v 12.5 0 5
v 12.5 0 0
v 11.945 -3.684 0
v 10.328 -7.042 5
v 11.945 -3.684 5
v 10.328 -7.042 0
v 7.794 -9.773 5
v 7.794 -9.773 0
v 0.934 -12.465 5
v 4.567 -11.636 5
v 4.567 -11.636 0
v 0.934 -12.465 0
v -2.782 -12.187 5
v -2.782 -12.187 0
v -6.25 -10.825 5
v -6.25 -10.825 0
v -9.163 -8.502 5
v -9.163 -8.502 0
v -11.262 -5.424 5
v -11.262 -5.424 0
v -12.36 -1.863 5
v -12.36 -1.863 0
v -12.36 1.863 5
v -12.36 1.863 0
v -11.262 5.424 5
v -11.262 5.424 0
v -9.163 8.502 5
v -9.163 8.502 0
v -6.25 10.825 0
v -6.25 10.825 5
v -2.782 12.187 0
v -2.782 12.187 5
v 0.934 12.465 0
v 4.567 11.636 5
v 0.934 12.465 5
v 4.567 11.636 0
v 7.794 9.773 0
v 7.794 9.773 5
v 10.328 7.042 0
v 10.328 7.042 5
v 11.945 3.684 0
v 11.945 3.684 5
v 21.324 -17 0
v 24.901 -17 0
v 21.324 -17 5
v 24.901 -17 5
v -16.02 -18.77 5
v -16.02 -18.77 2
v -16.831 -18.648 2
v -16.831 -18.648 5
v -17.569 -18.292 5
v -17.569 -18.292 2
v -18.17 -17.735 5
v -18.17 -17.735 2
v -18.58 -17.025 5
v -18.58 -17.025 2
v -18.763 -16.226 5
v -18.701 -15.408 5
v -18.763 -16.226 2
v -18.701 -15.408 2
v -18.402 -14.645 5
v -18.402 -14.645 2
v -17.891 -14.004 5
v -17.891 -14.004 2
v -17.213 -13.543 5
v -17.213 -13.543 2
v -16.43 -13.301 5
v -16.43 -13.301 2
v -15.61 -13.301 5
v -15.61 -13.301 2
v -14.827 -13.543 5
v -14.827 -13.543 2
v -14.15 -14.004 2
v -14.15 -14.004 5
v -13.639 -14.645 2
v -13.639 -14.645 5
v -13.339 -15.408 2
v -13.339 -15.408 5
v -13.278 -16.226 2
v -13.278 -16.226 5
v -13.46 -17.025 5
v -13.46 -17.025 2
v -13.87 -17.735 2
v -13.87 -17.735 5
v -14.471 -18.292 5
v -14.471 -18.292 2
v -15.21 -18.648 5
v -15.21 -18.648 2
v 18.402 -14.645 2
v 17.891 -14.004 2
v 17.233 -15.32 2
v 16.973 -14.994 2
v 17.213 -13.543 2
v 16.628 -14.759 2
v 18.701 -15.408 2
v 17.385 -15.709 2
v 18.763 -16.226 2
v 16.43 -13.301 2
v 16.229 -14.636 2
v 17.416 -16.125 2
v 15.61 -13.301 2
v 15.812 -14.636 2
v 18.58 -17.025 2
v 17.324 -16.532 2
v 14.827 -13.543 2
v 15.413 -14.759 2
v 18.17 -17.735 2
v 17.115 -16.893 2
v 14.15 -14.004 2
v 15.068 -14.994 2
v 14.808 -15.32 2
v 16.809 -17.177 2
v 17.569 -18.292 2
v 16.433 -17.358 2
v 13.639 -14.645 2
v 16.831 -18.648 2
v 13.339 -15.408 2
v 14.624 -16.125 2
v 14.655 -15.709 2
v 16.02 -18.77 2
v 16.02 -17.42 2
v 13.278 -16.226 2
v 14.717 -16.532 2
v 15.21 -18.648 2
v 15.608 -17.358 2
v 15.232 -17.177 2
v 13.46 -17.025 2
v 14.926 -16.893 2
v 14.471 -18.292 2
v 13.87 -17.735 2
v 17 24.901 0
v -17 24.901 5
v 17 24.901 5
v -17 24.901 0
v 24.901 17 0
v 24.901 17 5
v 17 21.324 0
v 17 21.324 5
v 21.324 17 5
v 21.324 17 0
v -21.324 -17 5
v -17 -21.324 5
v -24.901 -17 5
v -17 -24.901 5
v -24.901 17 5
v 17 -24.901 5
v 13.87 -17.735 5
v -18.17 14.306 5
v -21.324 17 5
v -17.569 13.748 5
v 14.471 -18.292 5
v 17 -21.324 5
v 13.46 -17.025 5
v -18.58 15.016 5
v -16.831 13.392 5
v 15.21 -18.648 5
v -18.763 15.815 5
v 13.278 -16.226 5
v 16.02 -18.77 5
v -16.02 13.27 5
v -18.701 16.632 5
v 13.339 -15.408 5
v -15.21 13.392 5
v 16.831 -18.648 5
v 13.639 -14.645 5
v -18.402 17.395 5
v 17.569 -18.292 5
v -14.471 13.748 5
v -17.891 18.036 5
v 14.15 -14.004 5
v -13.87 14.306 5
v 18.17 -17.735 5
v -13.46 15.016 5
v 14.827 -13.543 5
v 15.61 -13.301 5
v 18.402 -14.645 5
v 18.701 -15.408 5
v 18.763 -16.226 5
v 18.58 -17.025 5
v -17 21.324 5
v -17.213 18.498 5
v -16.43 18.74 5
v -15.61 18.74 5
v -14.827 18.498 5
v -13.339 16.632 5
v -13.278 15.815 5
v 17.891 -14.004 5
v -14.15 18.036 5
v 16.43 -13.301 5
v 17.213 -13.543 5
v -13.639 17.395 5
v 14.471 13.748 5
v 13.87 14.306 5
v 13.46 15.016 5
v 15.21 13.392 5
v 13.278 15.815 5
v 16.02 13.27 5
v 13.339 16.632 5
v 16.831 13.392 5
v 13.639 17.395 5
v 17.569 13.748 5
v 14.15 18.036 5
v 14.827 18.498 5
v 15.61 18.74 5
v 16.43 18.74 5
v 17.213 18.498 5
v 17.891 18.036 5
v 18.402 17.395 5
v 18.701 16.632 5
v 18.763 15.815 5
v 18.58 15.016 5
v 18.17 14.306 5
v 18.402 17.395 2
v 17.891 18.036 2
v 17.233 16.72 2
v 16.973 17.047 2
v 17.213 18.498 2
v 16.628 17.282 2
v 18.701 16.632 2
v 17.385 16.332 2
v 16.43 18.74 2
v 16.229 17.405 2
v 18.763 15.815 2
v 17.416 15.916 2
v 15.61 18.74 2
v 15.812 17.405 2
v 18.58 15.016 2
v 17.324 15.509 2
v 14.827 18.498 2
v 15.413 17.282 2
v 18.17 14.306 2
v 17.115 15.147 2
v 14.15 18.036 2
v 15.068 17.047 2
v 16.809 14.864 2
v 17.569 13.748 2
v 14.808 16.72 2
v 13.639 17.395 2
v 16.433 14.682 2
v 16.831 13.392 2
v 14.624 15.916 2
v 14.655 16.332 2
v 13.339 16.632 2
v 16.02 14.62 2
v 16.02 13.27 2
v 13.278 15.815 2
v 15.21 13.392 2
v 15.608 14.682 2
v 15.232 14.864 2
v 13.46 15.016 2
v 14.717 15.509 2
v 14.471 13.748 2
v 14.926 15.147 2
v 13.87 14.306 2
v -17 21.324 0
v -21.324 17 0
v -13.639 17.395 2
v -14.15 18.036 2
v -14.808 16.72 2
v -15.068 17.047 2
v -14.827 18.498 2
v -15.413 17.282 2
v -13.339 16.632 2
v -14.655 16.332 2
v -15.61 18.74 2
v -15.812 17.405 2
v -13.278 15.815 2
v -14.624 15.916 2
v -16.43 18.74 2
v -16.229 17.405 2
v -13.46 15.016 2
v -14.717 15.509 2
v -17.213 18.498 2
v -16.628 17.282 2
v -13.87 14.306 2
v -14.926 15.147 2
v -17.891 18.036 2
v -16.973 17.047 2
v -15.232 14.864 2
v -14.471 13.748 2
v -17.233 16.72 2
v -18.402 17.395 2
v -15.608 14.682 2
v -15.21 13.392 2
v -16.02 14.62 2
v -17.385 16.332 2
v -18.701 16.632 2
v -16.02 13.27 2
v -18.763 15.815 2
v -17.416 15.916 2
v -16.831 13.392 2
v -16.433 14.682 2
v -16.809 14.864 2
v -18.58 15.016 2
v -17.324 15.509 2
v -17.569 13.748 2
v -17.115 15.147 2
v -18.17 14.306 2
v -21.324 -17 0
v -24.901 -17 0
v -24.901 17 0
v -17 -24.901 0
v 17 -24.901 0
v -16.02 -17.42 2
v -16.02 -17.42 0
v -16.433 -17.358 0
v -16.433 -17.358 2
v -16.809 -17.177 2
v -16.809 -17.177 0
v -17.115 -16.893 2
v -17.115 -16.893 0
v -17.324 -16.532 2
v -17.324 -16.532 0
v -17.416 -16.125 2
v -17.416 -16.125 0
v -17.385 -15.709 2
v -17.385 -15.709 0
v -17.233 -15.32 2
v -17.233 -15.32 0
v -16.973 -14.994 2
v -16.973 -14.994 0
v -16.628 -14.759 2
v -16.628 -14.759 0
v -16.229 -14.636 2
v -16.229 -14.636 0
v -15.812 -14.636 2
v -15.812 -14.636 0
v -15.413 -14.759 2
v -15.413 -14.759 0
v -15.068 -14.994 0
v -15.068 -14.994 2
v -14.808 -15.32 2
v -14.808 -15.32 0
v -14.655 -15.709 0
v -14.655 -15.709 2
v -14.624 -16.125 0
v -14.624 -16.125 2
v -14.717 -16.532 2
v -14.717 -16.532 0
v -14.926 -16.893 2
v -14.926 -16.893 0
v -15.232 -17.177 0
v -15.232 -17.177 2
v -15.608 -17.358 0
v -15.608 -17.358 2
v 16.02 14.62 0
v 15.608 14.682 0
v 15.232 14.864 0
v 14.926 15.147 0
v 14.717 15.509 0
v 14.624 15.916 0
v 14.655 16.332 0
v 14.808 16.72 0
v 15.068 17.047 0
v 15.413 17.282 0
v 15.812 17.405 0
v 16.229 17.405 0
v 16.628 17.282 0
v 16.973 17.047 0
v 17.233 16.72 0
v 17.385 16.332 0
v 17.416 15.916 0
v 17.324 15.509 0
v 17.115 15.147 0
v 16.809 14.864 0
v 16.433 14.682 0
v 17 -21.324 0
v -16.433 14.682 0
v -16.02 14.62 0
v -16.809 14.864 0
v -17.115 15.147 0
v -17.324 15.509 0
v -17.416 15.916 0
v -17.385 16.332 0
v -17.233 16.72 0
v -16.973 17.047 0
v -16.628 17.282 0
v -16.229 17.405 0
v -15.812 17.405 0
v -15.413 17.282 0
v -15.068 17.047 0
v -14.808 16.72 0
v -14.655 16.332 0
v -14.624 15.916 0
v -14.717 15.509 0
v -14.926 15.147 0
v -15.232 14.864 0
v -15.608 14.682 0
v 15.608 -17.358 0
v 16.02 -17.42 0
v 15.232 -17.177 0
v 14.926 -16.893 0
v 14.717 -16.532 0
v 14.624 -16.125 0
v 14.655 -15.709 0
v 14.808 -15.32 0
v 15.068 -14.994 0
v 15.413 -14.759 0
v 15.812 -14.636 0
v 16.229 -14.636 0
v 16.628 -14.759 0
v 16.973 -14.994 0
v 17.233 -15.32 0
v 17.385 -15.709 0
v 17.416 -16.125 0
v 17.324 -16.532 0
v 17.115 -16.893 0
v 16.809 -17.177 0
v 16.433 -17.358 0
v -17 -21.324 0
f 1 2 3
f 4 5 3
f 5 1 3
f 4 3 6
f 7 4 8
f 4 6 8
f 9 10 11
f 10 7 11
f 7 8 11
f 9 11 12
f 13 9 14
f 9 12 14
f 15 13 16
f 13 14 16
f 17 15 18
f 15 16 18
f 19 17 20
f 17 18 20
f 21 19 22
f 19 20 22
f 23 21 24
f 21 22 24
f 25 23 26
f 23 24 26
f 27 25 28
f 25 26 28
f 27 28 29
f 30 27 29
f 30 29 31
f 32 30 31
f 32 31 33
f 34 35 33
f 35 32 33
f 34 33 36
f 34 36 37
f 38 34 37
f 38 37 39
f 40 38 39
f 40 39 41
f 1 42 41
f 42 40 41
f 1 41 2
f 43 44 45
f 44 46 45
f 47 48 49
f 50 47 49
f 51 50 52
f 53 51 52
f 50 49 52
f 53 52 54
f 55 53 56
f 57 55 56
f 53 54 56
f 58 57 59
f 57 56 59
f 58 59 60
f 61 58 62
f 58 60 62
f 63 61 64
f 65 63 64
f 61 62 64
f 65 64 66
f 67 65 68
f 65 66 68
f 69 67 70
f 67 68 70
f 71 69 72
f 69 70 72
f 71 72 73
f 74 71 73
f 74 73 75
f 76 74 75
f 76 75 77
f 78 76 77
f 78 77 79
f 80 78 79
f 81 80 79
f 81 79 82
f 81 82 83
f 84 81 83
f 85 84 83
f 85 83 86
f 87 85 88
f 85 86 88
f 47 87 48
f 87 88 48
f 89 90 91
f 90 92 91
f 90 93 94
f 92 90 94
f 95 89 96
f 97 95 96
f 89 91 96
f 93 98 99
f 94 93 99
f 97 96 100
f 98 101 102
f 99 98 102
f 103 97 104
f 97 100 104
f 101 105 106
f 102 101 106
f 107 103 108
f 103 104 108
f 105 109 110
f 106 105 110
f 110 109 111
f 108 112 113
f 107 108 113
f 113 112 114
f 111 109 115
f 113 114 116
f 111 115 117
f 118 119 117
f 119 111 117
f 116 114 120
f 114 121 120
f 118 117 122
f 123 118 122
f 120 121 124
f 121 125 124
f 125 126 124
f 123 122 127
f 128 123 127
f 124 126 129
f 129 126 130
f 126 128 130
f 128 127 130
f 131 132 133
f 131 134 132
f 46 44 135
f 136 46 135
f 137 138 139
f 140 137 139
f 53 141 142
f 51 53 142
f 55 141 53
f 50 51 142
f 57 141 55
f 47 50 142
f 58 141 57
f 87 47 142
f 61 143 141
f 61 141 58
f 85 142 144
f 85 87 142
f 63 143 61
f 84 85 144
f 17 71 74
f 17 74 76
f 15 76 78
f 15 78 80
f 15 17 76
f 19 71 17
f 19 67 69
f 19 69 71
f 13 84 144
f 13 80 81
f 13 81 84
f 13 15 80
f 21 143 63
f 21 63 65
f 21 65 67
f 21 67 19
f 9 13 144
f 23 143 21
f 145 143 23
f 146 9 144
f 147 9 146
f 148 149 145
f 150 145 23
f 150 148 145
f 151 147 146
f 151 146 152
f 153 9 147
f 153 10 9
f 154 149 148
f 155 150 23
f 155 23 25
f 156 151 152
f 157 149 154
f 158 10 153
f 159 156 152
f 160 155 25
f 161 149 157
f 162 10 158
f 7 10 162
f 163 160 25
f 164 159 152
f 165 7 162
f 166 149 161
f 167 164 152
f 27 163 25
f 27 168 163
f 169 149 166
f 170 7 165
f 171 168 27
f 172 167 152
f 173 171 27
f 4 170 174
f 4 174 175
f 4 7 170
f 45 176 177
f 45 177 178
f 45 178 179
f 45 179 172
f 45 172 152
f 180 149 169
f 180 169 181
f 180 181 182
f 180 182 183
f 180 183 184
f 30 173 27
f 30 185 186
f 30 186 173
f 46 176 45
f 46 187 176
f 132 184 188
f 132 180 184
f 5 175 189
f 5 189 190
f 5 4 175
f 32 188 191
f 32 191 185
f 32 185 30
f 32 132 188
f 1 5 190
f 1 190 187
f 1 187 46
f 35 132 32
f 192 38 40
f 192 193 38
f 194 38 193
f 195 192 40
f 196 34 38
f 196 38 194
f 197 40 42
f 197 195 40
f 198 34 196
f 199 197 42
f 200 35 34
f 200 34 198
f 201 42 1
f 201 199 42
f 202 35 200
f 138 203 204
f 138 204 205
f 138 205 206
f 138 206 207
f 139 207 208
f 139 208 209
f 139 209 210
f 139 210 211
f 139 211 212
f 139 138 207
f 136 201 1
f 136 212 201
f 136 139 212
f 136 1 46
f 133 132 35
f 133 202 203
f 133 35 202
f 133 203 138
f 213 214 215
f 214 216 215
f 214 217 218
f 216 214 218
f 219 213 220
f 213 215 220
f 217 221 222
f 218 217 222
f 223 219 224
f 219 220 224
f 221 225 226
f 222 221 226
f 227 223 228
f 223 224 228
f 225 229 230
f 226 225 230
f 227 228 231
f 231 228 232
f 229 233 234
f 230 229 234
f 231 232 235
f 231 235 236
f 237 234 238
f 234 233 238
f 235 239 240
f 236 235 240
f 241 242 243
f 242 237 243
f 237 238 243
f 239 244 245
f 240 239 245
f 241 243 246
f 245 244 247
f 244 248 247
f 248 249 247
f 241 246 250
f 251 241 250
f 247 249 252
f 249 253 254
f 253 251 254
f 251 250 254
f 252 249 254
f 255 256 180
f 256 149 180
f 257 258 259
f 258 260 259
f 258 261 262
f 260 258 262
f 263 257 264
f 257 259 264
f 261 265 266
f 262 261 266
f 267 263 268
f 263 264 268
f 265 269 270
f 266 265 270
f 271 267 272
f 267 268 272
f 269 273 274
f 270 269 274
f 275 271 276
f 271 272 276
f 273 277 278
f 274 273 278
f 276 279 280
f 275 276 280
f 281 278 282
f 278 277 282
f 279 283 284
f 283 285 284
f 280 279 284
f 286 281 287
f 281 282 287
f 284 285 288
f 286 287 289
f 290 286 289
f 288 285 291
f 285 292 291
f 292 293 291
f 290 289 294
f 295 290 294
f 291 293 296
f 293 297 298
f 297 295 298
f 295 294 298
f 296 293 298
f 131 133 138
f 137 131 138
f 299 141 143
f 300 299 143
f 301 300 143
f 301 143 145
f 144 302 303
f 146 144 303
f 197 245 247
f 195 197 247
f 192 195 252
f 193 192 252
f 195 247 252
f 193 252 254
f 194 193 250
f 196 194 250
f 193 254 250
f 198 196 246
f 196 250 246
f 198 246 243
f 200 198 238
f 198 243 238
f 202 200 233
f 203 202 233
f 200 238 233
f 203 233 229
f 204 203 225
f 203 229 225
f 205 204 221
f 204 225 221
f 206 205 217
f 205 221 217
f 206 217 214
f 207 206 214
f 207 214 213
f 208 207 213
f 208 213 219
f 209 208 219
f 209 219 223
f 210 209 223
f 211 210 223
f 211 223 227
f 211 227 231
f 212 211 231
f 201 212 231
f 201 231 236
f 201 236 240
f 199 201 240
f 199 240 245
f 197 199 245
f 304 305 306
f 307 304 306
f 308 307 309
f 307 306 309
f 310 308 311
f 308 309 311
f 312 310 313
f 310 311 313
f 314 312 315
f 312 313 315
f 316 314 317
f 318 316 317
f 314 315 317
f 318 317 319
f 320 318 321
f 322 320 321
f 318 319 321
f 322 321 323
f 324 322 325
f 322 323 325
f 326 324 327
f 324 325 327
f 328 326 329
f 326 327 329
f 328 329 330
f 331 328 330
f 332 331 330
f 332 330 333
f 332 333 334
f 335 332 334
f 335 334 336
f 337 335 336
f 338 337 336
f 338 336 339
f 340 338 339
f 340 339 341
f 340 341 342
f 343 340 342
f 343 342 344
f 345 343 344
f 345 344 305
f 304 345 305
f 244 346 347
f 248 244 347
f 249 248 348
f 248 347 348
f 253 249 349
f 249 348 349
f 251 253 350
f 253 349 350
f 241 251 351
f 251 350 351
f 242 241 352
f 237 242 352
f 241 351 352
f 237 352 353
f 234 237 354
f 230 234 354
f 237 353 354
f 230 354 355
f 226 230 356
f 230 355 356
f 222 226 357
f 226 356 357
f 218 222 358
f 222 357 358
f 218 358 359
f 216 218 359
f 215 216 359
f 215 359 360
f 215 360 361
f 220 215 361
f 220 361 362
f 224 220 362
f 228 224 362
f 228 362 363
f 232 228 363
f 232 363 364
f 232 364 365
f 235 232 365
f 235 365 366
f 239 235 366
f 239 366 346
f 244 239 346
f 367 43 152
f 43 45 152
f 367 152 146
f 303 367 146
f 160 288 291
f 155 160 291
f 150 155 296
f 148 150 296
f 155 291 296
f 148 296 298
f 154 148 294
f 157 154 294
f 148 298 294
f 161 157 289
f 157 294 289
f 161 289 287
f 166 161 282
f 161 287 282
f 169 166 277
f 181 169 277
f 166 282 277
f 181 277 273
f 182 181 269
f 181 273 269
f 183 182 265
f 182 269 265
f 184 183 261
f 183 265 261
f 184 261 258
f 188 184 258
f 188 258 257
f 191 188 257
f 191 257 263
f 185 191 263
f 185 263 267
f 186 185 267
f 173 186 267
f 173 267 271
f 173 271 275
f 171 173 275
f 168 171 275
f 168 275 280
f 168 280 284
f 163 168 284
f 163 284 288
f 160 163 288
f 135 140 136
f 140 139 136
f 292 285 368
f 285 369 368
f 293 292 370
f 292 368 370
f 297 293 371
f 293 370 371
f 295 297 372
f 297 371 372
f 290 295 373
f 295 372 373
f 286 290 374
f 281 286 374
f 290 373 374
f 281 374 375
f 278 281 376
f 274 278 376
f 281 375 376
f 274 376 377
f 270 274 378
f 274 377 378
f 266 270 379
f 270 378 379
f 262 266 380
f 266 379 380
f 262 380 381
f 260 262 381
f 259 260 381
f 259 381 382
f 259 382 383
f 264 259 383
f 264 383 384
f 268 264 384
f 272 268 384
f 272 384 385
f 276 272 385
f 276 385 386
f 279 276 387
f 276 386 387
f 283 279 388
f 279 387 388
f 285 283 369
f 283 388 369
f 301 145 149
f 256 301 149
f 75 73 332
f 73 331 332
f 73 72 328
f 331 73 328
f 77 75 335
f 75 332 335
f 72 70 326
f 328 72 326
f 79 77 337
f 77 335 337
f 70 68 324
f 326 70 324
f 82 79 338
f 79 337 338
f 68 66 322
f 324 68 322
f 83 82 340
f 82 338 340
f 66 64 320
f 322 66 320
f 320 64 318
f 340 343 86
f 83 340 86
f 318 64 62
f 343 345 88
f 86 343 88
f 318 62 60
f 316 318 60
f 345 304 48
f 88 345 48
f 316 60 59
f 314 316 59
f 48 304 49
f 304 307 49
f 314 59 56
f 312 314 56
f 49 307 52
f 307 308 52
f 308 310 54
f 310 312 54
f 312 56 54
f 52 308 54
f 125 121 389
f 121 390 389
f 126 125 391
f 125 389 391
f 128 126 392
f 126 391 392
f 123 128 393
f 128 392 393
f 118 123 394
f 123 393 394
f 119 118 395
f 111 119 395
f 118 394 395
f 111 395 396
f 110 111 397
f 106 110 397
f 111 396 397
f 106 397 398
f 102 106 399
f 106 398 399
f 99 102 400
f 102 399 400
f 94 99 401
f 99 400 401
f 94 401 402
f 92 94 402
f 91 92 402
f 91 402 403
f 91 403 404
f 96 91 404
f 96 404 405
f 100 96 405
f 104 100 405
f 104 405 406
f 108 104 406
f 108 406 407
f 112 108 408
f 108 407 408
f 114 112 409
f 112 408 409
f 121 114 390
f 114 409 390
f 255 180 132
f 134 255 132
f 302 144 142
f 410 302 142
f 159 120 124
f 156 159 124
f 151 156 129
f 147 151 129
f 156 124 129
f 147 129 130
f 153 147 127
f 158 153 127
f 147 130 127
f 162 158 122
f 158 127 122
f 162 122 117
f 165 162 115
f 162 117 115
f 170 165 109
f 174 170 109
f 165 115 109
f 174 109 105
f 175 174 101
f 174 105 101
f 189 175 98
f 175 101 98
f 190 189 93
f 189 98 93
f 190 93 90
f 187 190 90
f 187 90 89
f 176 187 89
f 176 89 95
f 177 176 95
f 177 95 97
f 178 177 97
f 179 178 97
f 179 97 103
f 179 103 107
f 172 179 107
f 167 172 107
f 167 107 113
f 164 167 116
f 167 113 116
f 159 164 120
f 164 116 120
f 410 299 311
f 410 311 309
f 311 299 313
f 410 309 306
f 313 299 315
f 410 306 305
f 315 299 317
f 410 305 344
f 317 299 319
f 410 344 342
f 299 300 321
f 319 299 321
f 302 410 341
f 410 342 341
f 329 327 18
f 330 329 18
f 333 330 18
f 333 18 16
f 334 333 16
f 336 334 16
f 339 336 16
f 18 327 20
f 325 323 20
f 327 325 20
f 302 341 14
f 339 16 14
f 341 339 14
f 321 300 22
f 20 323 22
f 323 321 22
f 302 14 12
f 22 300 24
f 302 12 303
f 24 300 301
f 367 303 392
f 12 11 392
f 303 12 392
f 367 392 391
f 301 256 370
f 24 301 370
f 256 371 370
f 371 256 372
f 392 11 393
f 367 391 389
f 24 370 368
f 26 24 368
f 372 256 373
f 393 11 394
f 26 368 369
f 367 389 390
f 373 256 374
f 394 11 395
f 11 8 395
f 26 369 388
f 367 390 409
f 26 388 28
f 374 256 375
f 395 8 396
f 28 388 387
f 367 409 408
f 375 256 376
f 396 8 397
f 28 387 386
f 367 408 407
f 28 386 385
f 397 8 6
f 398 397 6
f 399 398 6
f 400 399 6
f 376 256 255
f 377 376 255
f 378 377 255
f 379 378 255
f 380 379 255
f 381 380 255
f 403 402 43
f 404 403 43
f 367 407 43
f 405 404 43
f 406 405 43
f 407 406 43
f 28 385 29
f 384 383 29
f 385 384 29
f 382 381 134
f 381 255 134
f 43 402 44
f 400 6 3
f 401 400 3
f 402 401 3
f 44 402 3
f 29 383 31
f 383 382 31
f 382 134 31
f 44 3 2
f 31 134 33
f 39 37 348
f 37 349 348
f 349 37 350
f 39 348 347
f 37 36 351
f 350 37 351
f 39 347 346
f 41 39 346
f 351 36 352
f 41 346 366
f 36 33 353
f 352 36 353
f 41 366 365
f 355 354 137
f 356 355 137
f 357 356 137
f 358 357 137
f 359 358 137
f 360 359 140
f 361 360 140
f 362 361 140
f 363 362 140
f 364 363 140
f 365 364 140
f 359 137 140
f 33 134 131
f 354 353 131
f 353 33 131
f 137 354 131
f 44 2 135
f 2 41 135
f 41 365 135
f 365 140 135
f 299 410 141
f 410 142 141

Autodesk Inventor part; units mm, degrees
ref_plane "YZ Plane" through (0, 0, 0) normal (1, 0, 0) x (0, 1, 0)
ref_plane "XZ Plane" through (0, 0, 0) normal (0, 1, 0) x (-1, 0, 0)
ref_plane "XY Plane" through (0, 0, 0) normal (0, 0, 1) x (1, 0, 0)
sketch "Sketch1" plane through (0, 0, 0) normal (0, 0, 1) x (1, 0, 0)
  line L0 (-39.3843, 0) -> (62.0012, 0) construction
  line L1 (0, -36.6008) -> (0, 45.3001) construction
  line L2 (0, 0) -> (33.6, 33.6) construction
  line L3 (0, 0) -> (47.5176, 0) construction
  line L4 (0, 24.9006) -> (16.8, 24.9006)
  line L5 (16.8, 24.9006) -> (16.8, 21.2406)
  line L6 (16.8, 21.2406) -> (19.0203, 19.0203)
  line L7 (24.9006, 0) -> (24.9006, 16.8)
  line L8 (24.9006, 16.8) -> (21.2406, 16.8)
  line L9 (21.2406, 16.8) -> (19.0203, 19.0203)
  line L10 (0, 24.9006) -> (-16.8, 24.9006)
  line L11 (-16.8, 24.9006) -> (-16.8, 21.2406)
  line L12 (-16.8, 21.2406) -> (-19.0203, 19.0203)
  line L13 (-24.9006, 0) -> (-24.9006, 16.8)
  line L14 (-24.9006, 16.8) -> (-21.2406, 16.8)
  line L15 (-21.2406, 16.8) -> (-19.0203, 19.0203)
  line L16 (0, -24.9006) -> (16.8, -24.9006)
  line L17 (16.8, -24.9006) -> (16.8, -21.2406)
  line L18 (16.8, -21.2406) -> (19.0203, -19.0203)
  line L19 (24.9006, 0) -> (24.9006, -16.8)
  line L20 (24.9006, -16.8) -> (21.2406, -16.8)
  line L21 (21.2406, -16.8) -> (19.0203, -19.0203)
  line L22 (0, -24.9006) -> (-16.8, -24.9006)
  line L23 (-16.8, -24.9006) -> (-16.8, -21.2406)
  line L24 (-16.8, -21.2406) -> (-19.0203, -19.0203)
  line L25 (-24.9006, 0) -> (-24.9006, -16.8)
  line L26 (-24.9006, -16.8) -> (-21.2406, -16.8)
  line L27 (-21.2406, -16.8) -> (-19.0203, -19.0203)
  circle A0 centre (0, 0) radius 12.5
  dimension "d0" = 45
  dimension "d1" = 16.8
  dimension "d2" = 3.66
  dimension "d3" = 3.14
  dimension "d4" = 25
extrude "Extrusion1" add sketch "Sketch1" along normal blind 5
sketch "Sketch2" plane through (0, 0, 5) normal (0, 0, 1) x (1, 0, 0)
  circle A0 centre (0, 0) radius 12.5 construction
  line L0 (16.8, 24.9006) -> (-16.8, 24.9006) construction
  line L1 (-16.8, 24.9006) -> (-16.8, 21.2406) construction
  line L2 (-16.8, 21.2406) -> (-21.2406, 16.8) construction
  line L3 (-21.2406, 16.8) -> (-24.9006, 16.8) construction
  line L4 (-24.9006, 16.8) -> (-24.9006, -16.8) construction
  line L5 (-24.9006, -16.8) -> (-21.2406, -16.8) construction
  line L6 (-21.2406, -16.8) -> (-16.8, -21.2406) construction
  line L7 (-16.8, -21.2406) -> (-16.8, -24.9006) construction
  line L8 (-16.8, -24.9006) -> (16.8, -24.9006) construction
  line L9 (16.8, -24.9006) -> (16.8, -21.2406) construction
  line L10 (16.8, -21.2406) -> (21.2406, -16.8) construction
  line L11 (21.2406, -16.8) -> (24.9006, -16.8) construction
  line L12 (24.9006, -16.8) -> (24.9006, 16.8) construction
  line L13 (24.9006, 16.8) -> (21.2406, 16.8) construction
  line L14 (21.2406, 16.8) -> (16.8, 21.2406) construction
  line L15 (16.8, 21.2406) -> (16.8, 24.9006) construction
  circle A1 centre (16.0203, -16.0203) radius 2.1846 construction
  circle A2 centre (-16.0203, -16.0203) radius 2.1846 construction
  circle A3 centre (-16.0203, 16.0203) radius 2.1846 construction
  circle A4 centre (16.0203, 16.0203) radius 2.1846 construction
  circle A5 centre (0, 0) radius 14 construction
  line L16 (-19.0203, 17.0203) -> (-19.0203, -17.0203) construction
  arc A6 (-17.0203, 19.0203) -> (-19.0203, 17.0203) centre (-17.0203, 17.0203) ccw construction
  line L17 (17.0203, 19.0203) -> (-17.0203, 19.0203) construction
  arc A7 (19.0203, 17.0203) -> (17.0203, 19.0203) centre (17.0203, 17.0203) ccw construction
  line L18 (19.0203, -17.0203) -> (19.0203, 17.0203) construction
  arc A8 (17.0203, -19.0203) -> (19.0203, -17.0203) centre (17.0203, -17.0203) ccw construction
  line L19 (-17.0203, -19.0203) -> (17.0203, -19.0203) construction
  arc A9 (-19.0203, -17.0203) -> (-17.0203, -19.0203) centre (-17.0203, -17.0203) ccw construction
hole "Hole1" at (-16.0203, 16.0203, 5) at (16.0203, 16.0203, 5) at (16.0203, -16.0203, 5) at (-16.0203, -16.0203, 5) direction (0, 0, -1) diameter 2.8 end through all counterbore diameter 5.5 counterbore depth 3
sketch "Skizze3" plane through (0, 0, 5) normal (0, 0, 1) x (1, 0, 0)
  circle A0 centre (16.0203, -16.0203) radius 2.75 construction
  circle A1 centre (-16.0203, 16.0203) radius 2.75 construction
  circle A2 centre (16.0203, 16.0203) radius 2.75 construction
  circle A3 centre (-16.0203, -16.0203) radius 2.75 construction
  circle A4 centre (0, 0) radius 12.5 construction
  line L0 (16.8, 24.9006) -> (-16.8, 24.9006) construction
  line L1 (-16.8, 24.9006) -> (-16.8, 21.2406) projected
  line L2 (-16.8, 21.2406) -> (-21.2406, 16.8) projected
  line L3 (-21.2406, 16.8) -> (-24.9006, 16.8) projected
  line L4 (-24.9006, 16.8) -> (-24.9006, -16.8) construction
  line L5 (-24.9006, -16.8) -> (-21.2406, -16.8) projected
  line L6 (-21.2406, -16.8) -> (-16.8, -21.2406) projected
  line L7 (-16.8, -21.2406) -> (-16.8, -24.9006) projected
  line L8 (-16.8, -24.9006) -> (16.8, -24.9006) construction
  line L9 (16.8, -24.9006) -> (16.8, -21.2406) projected
  line L10 (16.8, -21.2406) -> (21.2406, -16.8) projected
  line L11 (21.2406, -16.8) -> (24.9006, -16.8) projected
  line L12 (24.9006, -16.8) -> (24.9006, 16.8) construction
  line L13 (24.9006, 16.8) -> (21.2406, 16.8) projected
  line L14 (21.2406, 16.8) -> (16.8, 21.2406) projected
  line L15 (16.8, 21.2406) -> (16.8, 24.9006) projected
  line L16 (-17, 25.1006) -> (17, 25.1006) construction
  line L17 (17, 25.1006) -> (17, 21.3235)
  line L18 (17, 21.3235) -> (21.3235, 17)
  line L19 (21.3235, 17) -> (25.1006, 17)
  line L20 (25.1006, 17) -> (25.1006, -17) construction
  line L21 (25.1006, -17) -> (21.3235, -17)
  line L22 (21.3235, -17) -> (17, -21.3235)
  line L23 (17, -21.3235) -> (17, -25.1006)
  line L24 (17, -25.1006) -> (-17, -25.1006) construction
  line L25 (-17, -25.1006) -> (-17, -21.3235)
  line L26 (-17, -21.3235) -> (-21.3235, -17)
  line L27 (-21.3235, -17) -> (-25.1006, -17)
  line L28 (-25.1006, -17) -> (-25.1006, 17) construction
  line L29 (-25.1006, 17) -> (-21.3235, 17)
  line L30 (-21.3235, 17) -> (-17, 21.3235)
  line L31 (-17, 21.3235) -> (-17, 25.1006)
  line L32 (-24.9006, 16.8) -> (-24.9006, 17)
  line L33 (-16.8, 24.9006) -> (-17, 24.9006)
  line L34 (16.8, 24.9006) -> (17, 24.9006)
  line L35 (24.9006, 16.8) -> (24.9006, 17)
  line L36 (24.9006, -16.8) -> (24.9006, -17)
  line L37 (16.8, -24.9006) -> (16.8, -21.2406) projected
  line L38 (16.8, -24.9006) -> (17, -24.9006)
  line L39 (-16.8, -24.9006) -> (-17, -24.9006)
  line L40 (-24.9006, -16.8) -> (-24.9006, -17)
  dimension "d14" = 0.2
extrude "IM_offset" add sketch "Skizze3" against normal up to surface (5 mm away)
properties part number "20_Cube_insert_Sample_holder_magnetic_v3"
